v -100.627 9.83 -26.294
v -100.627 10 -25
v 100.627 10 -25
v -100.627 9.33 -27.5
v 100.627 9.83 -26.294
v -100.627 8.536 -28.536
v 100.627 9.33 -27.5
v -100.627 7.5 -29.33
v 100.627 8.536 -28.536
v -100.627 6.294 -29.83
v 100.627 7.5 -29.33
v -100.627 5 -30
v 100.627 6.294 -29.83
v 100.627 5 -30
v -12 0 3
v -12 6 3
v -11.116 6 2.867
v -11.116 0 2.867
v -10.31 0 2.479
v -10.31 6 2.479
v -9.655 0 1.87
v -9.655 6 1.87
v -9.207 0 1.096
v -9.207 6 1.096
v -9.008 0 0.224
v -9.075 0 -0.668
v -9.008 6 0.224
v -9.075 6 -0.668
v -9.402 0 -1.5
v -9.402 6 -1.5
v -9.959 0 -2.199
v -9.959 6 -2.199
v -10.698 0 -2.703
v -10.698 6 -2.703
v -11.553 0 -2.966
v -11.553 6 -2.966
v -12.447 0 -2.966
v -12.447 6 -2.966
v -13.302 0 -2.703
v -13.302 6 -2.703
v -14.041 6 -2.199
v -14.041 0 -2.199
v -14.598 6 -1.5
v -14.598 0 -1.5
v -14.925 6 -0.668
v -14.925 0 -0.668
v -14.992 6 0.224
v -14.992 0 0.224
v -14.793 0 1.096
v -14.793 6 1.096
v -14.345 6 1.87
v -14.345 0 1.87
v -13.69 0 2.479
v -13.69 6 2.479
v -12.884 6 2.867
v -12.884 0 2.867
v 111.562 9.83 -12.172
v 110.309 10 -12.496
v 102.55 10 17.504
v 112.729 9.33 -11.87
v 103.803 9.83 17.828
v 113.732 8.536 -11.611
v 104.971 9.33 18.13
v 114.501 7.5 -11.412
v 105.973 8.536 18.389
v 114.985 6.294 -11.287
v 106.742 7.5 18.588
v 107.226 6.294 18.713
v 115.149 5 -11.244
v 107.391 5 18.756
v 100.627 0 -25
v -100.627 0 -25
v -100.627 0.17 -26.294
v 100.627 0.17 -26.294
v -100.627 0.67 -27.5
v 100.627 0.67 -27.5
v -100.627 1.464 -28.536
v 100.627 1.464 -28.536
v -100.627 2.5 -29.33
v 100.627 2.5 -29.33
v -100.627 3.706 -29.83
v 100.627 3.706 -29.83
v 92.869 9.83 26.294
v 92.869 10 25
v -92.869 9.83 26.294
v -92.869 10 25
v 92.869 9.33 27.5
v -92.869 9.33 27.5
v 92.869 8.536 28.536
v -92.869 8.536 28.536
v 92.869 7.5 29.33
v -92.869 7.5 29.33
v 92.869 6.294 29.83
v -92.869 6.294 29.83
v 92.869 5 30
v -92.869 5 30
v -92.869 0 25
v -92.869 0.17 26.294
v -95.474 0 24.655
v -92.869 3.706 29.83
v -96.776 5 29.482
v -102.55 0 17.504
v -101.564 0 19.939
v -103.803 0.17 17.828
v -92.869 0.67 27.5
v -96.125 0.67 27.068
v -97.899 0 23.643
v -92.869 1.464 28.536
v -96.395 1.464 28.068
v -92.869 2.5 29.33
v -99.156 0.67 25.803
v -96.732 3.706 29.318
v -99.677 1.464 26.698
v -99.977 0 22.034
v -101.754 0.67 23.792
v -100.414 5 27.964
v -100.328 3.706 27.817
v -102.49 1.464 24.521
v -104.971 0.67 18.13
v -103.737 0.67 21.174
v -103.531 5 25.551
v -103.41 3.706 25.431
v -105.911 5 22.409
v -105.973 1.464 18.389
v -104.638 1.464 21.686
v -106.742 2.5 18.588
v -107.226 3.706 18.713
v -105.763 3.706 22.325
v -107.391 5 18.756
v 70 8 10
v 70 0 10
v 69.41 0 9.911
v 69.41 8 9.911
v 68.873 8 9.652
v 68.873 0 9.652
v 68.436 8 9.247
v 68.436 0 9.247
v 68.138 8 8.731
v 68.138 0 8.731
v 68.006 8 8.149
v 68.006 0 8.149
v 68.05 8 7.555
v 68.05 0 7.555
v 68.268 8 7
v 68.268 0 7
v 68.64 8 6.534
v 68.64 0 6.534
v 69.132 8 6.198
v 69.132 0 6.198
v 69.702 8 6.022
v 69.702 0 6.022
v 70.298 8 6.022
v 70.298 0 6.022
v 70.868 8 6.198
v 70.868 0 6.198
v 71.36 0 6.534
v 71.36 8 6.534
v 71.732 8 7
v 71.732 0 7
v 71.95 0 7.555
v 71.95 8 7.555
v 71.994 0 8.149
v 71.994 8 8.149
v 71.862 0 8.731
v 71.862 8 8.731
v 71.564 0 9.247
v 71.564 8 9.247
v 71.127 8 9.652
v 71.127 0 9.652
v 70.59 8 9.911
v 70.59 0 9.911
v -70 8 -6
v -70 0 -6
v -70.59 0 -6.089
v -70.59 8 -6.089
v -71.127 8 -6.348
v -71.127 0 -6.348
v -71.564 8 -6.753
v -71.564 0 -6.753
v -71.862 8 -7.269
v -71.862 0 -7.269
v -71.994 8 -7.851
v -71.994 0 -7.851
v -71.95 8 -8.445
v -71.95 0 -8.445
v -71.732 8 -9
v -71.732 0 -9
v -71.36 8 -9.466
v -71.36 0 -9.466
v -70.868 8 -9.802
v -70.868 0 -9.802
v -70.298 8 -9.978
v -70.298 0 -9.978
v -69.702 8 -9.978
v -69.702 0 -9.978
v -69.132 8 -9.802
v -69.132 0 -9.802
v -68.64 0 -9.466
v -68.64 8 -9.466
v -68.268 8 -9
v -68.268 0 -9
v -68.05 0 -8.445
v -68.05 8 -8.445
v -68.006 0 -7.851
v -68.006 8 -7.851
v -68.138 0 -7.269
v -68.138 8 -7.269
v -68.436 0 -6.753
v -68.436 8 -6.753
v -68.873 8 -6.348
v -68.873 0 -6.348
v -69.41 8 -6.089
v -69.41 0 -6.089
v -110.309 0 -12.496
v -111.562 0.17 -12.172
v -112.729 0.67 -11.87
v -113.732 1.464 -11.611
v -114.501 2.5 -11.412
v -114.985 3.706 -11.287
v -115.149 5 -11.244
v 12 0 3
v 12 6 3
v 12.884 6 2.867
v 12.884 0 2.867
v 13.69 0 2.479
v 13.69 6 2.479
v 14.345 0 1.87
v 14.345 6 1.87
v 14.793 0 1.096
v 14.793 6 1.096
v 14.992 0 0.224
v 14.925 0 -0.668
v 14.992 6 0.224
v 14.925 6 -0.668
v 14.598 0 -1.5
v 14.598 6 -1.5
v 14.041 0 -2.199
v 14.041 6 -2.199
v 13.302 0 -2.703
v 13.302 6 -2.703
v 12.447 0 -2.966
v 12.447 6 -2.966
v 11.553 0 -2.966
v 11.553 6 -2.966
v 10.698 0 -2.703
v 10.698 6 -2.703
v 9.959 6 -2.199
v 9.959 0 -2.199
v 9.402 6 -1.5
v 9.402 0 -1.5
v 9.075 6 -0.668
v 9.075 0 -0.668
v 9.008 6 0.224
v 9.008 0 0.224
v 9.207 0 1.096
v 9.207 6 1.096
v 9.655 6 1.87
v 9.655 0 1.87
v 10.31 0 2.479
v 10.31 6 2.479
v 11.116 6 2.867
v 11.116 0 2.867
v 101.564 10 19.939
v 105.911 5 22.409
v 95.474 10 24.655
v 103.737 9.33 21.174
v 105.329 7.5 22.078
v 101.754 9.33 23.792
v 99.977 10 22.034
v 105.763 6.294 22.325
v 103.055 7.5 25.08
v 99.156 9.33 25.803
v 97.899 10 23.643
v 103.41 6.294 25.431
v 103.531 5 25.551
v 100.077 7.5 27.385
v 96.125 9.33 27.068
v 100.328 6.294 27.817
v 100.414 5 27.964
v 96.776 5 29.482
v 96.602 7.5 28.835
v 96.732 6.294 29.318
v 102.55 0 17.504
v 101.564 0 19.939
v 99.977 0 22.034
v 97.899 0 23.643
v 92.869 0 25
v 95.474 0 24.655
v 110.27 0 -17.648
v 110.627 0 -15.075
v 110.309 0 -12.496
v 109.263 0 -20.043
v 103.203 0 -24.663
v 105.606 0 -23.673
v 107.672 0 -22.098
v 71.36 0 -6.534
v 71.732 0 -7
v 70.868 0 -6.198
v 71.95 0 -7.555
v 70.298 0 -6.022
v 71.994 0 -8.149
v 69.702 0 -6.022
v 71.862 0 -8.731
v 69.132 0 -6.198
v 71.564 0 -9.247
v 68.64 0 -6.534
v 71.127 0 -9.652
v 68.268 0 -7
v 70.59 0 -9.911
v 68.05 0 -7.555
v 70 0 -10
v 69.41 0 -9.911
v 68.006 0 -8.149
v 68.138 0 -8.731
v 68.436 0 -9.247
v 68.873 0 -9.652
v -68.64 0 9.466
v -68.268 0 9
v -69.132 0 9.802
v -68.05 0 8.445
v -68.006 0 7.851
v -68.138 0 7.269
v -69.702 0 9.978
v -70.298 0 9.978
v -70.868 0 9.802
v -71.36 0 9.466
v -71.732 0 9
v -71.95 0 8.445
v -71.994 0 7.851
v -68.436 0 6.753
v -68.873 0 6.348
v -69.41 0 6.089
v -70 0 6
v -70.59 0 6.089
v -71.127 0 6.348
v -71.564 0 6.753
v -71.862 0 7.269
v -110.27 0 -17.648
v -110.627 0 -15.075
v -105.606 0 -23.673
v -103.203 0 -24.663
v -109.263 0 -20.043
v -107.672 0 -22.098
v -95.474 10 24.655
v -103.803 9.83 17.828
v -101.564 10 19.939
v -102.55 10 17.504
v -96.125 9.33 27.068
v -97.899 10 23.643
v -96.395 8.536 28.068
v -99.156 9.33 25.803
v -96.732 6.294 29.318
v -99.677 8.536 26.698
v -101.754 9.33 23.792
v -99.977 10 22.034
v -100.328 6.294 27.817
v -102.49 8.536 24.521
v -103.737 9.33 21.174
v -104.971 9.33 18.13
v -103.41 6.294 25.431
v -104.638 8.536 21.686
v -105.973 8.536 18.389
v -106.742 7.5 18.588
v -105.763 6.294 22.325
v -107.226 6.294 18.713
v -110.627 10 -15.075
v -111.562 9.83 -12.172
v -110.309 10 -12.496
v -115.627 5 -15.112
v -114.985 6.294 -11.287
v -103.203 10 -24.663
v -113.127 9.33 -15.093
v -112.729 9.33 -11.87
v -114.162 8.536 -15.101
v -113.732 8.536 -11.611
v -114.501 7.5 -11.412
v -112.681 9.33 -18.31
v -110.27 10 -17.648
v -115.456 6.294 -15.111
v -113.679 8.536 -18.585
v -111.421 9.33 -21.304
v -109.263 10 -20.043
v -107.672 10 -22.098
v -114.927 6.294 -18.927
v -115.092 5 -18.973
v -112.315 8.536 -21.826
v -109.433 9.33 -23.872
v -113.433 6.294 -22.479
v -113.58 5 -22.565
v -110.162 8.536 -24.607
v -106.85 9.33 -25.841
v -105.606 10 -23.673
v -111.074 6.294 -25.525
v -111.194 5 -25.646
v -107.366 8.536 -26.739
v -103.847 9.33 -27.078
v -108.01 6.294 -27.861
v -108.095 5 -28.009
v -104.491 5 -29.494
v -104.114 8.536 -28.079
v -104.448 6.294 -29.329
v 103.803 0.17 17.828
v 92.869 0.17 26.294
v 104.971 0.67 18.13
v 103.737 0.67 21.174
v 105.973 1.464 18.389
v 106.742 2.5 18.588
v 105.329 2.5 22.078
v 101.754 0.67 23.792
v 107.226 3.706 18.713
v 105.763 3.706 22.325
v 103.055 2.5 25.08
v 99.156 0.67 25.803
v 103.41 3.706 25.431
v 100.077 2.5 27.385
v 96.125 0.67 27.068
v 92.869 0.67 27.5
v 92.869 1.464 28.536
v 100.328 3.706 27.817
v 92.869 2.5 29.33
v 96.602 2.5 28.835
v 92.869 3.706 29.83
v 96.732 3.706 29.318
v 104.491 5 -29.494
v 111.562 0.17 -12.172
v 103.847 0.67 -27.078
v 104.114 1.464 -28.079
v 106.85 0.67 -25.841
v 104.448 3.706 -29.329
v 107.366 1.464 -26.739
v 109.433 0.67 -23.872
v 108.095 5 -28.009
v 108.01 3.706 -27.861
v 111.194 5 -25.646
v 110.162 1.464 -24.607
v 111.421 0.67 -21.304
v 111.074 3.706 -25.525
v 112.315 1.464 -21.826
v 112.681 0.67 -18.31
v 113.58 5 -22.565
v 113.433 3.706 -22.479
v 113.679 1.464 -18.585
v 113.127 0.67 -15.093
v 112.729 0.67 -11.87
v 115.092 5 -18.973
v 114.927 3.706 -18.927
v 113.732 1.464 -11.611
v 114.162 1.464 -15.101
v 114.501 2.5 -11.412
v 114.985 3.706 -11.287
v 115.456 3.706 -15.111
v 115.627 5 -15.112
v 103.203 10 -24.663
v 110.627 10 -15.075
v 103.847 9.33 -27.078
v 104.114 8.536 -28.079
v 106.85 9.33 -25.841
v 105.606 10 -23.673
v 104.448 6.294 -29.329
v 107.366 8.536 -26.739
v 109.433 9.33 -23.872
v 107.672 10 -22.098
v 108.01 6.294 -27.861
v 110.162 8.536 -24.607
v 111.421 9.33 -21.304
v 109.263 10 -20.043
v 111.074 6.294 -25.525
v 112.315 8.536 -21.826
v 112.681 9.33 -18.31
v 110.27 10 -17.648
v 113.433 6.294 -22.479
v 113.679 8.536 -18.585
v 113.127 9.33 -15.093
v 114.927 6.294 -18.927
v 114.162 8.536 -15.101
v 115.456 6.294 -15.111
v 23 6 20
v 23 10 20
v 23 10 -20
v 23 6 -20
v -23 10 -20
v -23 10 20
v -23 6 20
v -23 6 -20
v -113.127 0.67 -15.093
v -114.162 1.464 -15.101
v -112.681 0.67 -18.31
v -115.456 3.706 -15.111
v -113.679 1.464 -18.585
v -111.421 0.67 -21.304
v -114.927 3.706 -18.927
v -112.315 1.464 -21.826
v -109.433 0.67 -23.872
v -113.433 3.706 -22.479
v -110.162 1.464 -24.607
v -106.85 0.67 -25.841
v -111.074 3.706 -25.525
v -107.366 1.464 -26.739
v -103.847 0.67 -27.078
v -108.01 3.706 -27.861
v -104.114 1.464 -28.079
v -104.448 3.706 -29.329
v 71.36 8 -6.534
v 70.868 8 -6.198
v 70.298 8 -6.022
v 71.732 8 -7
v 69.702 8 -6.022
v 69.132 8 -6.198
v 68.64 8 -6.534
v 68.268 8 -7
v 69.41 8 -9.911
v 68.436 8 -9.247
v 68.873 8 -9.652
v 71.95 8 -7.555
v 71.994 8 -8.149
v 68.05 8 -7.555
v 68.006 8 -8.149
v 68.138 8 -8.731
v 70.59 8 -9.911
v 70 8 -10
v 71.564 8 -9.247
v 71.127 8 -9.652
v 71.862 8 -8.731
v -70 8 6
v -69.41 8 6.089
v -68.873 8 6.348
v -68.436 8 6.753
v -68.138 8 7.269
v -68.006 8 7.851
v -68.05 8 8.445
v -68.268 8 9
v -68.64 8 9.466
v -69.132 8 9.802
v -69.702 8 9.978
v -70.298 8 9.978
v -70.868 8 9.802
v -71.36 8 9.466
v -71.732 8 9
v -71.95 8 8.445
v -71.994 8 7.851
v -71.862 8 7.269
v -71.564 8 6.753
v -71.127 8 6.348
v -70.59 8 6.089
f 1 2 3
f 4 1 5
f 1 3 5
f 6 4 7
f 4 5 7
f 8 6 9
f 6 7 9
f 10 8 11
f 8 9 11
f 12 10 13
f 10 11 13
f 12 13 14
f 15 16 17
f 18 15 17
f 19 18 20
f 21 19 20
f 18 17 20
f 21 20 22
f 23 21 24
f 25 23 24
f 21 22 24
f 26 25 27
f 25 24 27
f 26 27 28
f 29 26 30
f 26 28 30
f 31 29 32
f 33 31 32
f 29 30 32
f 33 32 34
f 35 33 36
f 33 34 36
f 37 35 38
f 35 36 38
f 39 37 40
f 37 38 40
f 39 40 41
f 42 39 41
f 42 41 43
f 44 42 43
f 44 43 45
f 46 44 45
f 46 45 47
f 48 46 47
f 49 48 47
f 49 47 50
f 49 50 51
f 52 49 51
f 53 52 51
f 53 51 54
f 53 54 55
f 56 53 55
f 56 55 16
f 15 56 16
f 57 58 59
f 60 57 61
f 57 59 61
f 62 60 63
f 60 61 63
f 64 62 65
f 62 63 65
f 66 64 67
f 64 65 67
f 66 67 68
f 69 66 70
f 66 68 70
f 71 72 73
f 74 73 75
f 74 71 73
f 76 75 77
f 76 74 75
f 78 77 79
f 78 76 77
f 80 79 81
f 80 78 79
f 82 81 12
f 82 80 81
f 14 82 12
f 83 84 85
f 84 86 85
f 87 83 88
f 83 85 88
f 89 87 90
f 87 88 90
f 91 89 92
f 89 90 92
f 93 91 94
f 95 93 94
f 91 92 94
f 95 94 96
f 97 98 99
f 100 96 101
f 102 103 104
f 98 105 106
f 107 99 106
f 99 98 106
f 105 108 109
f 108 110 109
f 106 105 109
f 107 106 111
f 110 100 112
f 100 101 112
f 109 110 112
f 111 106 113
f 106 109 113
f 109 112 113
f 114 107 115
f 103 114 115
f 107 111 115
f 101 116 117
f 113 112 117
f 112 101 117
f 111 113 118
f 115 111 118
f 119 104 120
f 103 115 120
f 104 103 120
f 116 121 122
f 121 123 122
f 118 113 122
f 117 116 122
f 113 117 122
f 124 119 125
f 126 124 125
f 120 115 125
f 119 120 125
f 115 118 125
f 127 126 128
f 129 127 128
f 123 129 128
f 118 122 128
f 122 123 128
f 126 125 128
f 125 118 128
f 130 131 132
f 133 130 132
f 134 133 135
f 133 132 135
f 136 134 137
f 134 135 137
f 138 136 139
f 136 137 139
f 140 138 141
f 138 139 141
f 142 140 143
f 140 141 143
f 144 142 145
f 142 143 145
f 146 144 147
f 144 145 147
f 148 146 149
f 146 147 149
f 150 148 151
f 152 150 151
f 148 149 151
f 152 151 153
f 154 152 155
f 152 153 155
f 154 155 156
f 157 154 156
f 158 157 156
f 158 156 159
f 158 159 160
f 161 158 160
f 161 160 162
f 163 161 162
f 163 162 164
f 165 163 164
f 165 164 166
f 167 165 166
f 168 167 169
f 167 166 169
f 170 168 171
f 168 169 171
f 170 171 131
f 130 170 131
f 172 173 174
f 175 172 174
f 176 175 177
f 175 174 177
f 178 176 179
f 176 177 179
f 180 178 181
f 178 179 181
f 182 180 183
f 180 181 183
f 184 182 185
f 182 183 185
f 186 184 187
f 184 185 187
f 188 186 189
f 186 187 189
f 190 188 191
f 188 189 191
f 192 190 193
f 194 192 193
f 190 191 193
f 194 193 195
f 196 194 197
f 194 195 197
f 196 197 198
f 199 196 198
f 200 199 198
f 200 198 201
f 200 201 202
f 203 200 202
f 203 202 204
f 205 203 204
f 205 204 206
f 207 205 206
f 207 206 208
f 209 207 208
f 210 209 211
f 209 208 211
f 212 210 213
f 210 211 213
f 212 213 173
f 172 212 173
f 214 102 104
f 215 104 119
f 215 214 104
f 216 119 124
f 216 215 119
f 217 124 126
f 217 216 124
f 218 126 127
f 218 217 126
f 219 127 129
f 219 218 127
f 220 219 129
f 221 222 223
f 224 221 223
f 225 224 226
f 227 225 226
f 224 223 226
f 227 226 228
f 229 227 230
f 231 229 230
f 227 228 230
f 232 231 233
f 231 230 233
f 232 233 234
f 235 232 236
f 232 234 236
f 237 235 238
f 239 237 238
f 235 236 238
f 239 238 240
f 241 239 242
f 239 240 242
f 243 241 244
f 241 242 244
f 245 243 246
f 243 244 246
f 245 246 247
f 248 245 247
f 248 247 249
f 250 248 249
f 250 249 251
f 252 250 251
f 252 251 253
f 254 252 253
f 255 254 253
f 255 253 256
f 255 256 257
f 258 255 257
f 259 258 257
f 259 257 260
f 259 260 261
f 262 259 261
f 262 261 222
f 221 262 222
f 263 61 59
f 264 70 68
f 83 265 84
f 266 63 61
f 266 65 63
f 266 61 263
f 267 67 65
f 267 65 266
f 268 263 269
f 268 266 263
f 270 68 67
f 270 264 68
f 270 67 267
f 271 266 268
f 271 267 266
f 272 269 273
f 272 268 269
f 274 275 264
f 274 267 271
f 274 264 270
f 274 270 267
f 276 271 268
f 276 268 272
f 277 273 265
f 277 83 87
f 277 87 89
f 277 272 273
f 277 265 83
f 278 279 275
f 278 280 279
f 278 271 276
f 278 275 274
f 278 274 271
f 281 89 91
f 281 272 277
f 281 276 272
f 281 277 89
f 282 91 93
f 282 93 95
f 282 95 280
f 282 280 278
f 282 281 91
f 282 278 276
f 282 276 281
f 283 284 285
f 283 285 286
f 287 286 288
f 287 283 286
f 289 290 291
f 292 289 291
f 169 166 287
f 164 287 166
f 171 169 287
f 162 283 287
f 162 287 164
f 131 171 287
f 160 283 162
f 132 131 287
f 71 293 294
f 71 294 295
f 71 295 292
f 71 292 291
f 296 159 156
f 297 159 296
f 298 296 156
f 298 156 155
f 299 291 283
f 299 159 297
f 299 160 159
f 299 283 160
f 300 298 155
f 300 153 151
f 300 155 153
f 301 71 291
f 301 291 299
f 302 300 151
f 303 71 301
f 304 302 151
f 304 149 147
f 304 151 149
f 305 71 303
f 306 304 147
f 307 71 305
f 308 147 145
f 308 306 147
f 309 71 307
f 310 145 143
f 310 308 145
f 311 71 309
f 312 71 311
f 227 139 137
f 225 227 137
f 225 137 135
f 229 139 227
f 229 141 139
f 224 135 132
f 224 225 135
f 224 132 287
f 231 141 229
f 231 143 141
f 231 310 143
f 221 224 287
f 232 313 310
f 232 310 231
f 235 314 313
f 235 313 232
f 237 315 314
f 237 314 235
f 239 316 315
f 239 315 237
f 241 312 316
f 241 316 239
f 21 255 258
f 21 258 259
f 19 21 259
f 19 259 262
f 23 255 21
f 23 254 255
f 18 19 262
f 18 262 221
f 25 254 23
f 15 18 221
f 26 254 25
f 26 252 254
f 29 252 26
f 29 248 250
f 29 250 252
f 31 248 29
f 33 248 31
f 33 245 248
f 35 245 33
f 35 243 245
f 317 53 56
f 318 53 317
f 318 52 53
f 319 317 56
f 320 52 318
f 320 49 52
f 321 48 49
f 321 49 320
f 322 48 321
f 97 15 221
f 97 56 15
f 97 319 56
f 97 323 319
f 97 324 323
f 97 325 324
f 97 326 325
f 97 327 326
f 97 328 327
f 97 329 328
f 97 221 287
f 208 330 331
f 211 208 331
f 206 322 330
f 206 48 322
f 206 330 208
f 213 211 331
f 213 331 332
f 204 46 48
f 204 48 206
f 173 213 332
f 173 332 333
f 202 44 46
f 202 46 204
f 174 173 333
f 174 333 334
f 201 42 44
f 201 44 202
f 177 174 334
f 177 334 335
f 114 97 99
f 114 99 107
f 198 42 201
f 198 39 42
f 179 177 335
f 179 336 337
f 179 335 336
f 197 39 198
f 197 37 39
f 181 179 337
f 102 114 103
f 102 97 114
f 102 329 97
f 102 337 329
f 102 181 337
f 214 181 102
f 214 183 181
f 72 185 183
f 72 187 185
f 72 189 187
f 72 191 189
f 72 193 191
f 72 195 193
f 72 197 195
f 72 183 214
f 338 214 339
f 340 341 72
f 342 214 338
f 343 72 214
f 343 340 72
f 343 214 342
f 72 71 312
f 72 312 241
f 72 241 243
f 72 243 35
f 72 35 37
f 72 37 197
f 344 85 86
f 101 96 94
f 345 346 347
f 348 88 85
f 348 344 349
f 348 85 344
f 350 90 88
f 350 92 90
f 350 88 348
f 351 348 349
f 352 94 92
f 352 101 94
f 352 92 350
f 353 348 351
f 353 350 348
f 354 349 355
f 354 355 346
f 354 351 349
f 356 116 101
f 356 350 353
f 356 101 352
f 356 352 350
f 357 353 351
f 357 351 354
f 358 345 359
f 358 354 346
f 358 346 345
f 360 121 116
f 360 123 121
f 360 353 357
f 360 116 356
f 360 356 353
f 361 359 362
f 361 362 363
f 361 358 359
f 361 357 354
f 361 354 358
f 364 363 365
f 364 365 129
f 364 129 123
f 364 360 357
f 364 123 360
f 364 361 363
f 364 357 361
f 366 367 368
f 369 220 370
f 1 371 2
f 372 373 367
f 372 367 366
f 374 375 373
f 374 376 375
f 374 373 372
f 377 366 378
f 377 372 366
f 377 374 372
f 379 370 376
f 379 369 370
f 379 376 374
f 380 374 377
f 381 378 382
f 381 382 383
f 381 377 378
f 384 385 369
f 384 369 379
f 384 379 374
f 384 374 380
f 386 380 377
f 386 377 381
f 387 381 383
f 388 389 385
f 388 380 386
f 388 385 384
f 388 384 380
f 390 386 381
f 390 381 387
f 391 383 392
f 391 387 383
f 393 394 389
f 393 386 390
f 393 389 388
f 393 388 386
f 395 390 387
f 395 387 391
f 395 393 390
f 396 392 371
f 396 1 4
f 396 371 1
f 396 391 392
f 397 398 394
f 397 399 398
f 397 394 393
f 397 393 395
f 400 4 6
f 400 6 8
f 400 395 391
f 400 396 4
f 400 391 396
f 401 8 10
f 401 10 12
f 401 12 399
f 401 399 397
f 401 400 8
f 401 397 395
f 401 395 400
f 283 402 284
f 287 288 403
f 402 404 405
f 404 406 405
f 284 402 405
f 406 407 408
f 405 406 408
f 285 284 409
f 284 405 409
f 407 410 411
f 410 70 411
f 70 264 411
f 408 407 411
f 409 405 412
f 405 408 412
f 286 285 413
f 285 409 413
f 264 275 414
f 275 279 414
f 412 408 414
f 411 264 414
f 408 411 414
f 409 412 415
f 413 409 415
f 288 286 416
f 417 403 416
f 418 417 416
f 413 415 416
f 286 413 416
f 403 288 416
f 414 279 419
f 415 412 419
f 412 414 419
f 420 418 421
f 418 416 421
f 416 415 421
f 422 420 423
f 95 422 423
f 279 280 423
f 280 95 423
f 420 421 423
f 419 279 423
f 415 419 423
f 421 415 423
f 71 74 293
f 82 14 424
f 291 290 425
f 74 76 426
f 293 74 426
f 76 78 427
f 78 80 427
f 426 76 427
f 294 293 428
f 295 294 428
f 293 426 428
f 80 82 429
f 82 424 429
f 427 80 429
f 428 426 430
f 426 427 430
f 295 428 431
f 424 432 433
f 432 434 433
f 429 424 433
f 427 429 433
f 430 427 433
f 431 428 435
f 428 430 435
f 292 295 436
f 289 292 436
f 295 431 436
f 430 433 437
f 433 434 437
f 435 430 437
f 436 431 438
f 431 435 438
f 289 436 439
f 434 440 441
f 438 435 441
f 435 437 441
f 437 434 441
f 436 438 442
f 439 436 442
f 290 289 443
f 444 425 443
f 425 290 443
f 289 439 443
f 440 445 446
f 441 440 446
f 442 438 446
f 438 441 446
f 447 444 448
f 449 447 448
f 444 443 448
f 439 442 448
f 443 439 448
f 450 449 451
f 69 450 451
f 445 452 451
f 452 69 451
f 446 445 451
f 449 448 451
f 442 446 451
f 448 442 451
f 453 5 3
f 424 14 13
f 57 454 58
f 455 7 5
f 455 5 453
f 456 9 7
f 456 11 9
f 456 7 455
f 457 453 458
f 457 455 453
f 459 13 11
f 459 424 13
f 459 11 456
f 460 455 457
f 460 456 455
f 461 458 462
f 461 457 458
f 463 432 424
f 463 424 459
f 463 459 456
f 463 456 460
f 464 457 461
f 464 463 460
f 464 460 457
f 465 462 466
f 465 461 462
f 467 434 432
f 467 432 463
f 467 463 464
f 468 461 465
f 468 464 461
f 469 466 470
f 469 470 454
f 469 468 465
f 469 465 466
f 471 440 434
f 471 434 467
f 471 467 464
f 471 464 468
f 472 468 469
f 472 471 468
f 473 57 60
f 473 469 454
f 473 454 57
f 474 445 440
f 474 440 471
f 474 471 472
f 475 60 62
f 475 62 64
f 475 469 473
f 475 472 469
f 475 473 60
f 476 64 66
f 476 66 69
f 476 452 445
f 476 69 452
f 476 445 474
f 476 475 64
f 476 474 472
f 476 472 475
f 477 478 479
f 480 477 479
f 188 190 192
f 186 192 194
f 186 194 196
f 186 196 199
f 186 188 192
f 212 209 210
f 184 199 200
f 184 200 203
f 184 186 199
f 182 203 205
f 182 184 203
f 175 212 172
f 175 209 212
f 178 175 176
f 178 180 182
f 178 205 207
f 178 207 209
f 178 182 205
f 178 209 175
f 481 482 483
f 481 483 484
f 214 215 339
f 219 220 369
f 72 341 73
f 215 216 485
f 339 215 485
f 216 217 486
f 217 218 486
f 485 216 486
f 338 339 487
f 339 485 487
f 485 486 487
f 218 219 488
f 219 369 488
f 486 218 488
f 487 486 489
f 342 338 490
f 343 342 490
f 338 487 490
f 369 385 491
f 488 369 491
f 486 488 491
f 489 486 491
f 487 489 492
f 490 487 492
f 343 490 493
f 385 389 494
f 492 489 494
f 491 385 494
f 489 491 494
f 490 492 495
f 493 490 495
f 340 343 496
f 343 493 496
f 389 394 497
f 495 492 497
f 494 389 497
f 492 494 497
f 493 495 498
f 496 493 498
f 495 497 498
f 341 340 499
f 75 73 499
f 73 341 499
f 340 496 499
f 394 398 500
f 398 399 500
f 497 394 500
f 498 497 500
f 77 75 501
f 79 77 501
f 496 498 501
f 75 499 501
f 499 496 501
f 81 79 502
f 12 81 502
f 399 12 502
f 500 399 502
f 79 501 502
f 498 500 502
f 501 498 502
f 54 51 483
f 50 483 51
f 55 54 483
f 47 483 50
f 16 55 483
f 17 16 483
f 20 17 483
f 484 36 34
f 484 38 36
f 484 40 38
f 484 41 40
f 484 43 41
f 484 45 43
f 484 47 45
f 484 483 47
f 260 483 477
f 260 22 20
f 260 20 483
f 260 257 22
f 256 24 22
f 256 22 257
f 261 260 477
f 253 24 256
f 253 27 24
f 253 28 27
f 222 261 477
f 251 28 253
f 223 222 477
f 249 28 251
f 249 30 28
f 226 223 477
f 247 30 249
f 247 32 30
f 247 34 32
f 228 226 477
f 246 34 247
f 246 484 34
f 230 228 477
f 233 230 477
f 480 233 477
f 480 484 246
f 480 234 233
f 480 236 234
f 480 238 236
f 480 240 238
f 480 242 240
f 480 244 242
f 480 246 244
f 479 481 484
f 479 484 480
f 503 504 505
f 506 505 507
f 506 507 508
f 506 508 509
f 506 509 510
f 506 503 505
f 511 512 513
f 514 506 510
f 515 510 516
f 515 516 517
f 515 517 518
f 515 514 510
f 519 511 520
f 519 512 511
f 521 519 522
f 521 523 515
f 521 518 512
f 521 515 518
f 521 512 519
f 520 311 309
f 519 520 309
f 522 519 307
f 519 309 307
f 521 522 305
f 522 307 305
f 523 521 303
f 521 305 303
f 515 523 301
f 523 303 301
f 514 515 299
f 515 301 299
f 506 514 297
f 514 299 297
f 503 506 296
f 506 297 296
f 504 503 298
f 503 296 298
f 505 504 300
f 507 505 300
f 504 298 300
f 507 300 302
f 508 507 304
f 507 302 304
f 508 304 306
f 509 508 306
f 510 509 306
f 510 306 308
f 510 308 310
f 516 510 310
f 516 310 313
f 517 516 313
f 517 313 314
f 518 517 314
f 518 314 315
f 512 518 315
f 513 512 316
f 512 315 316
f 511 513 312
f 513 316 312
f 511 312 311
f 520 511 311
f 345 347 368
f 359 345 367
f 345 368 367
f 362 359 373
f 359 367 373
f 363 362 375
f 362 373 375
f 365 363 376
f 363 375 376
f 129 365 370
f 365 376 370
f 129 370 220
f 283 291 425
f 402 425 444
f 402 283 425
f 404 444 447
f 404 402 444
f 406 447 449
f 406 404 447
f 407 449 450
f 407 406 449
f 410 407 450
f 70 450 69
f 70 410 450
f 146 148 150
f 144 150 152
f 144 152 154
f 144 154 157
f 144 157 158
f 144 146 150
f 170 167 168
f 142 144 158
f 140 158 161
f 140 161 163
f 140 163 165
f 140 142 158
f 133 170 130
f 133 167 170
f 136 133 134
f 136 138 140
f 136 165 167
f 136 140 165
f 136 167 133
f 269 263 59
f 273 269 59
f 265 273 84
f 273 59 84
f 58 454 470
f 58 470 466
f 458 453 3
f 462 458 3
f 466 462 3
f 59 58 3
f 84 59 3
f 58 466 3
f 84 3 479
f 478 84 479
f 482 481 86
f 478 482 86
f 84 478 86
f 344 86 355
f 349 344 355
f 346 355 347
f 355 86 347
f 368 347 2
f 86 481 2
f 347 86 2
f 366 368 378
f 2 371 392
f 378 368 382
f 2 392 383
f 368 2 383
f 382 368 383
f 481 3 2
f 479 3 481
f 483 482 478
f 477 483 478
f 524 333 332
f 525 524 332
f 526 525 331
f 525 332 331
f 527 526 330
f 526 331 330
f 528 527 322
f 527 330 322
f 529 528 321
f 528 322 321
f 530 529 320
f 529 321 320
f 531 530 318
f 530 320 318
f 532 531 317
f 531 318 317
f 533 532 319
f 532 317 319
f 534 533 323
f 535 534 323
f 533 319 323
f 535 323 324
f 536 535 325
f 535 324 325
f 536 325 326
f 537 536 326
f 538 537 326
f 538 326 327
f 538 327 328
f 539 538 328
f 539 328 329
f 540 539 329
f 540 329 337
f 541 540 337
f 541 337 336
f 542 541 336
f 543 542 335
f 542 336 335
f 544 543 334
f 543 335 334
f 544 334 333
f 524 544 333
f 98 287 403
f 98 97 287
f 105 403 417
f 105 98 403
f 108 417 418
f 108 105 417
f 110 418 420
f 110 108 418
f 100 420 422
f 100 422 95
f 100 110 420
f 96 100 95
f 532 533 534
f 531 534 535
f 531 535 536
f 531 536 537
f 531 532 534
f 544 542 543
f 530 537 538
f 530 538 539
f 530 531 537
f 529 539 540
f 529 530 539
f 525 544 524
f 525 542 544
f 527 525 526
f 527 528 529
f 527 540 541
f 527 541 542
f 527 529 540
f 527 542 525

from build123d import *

# Parameters (mm, degrees)
BOSS_EXTRUDE1_DEPTH = 10
SKETCH2_W           = 46
SKETCH2_H           = 40
CUT_EXTRUDE1_DEPTH  = 4
SKETCH2_3_R         = 3
CUT_EXTRUDE2_DEPTH  = 120.873502812
FILLET1_R           = 5
SKETCH3_R           = 2
CUT_EXTRUDE3_DEPTH  = 8


with BuildPart() as part:
    # Sketch1 → Boss-Extrude1 (new body)
    with BuildSketch(Plane(origin=(0, 0, 0), x_dir=(1, 0, 0), z_dir=(0, 1, 0))):
        with BuildLine():
            Line((115.149446157, 11.244299939), (107.390918627, -18.755700061))
            ThreePointArc((107.390918627, -18.755700061), (102.051963222, -26.860343606), (92.868704021, -30))
            Line((92.868704021, -30), (-92.868704021, -30))
            ThreePointArc((-92.868704021, -30), (-102.051963222, -26.860343606), (-107.390918627, -18.755700061))
            Line((-107.390918627, -18.755700061), (-115.149446157, 11.244299939))
            ThreePointArc((-115.149446157, 11.244299939), (-112.487575158, 24.183259201), (-100.627231552, 30))
            Line((-100.627231552, 30), (100.627231552, 30))
            ThreePointArc((100.627231552, 30), (112.487575158, 24.183259201), (115.149446157, 11.244299939))
        make_face()
    extrude(amount=BOSS_EXTRUDE1_DEPTH)

    # Sketch2 → Cut-Extrude1 (cut)
    with BuildSketch(Plane(origin=(0, 10, 0), x_dir=(1, 0, 0), z_dir=(0, 1, 0))):
        Rectangle(SKETCH2_W, SKETCH2_H)
    extrude(amount=-CUT_EXTRUDE1_DEPTH, mode=Mode.SUBTRACT)

    # Sketch2<3> → Cut-Extrude2 (cut, through all)
    with BuildSketch(Plane(origin=(0, 10, 0), x_dir=(1, 0, 0), z_dir=(0, 1, 0))):
        with Locations(Location((-12, 0, 0), (0, 0, 270))):
            Circle(SKETCH2_3_R)
        with Locations(Location((12, 0, 0), (0, 0, 270))):
            Circle(SKETCH2_3_R)
    extrude(amount=-CUT_EXTRUDE2_DEPTH, mode=Mode.SUBTRACT)

    # Fillet1
    fillet1_edges = [part.edges().sort_by_distance(p)[0] for p in [
        (0, 0, 30),
        (-102.051963222, 0, 26.860343606),
        (-111.270182392, 0, 3.755700061),
        (-112.487575158, 0, -24.183259201),
        (0, 10, 30),
        (102.051963222, 10, 26.860343606),
        (111.270182392, 10, 3.755700061),
        (112.487575158, 10, -24.183259201),
        (0, 10, -30),
        (0, 0, -30),
        (-111.270182392, 10, 3.755700061),
        (111.270182392, 0, 3.755700061),
    ]]
    fillet(fillet1_edges, radius=FILLET1_R - 0.0001)  # a hair under: the kernel refuses the full size

    # Sketch3 → Cut-Extrude3 (cut)
    with BuildSketch(Plane.XZ):
        with Locations(Location((-70, 8, 0), (0, 0, 270))):
            Circle(SKETCH3_R)
        with Locations(Location((-70, -8, 0), (0, 0, 90))):
            Circle(SKETCH3_R)
        with Locations(Location((70, -8, 0), (0, 0, 270))):
            Circle(SKETCH3_R)
        with Locations(Location((70, 8, 0), (0, 0, 90))):
            Circle(SKETCH3_R)
    extrude(amount=-CUT_EXTRUDE3_DEPTH, mode=Mode.SUBTRACT)


solid = part.part
